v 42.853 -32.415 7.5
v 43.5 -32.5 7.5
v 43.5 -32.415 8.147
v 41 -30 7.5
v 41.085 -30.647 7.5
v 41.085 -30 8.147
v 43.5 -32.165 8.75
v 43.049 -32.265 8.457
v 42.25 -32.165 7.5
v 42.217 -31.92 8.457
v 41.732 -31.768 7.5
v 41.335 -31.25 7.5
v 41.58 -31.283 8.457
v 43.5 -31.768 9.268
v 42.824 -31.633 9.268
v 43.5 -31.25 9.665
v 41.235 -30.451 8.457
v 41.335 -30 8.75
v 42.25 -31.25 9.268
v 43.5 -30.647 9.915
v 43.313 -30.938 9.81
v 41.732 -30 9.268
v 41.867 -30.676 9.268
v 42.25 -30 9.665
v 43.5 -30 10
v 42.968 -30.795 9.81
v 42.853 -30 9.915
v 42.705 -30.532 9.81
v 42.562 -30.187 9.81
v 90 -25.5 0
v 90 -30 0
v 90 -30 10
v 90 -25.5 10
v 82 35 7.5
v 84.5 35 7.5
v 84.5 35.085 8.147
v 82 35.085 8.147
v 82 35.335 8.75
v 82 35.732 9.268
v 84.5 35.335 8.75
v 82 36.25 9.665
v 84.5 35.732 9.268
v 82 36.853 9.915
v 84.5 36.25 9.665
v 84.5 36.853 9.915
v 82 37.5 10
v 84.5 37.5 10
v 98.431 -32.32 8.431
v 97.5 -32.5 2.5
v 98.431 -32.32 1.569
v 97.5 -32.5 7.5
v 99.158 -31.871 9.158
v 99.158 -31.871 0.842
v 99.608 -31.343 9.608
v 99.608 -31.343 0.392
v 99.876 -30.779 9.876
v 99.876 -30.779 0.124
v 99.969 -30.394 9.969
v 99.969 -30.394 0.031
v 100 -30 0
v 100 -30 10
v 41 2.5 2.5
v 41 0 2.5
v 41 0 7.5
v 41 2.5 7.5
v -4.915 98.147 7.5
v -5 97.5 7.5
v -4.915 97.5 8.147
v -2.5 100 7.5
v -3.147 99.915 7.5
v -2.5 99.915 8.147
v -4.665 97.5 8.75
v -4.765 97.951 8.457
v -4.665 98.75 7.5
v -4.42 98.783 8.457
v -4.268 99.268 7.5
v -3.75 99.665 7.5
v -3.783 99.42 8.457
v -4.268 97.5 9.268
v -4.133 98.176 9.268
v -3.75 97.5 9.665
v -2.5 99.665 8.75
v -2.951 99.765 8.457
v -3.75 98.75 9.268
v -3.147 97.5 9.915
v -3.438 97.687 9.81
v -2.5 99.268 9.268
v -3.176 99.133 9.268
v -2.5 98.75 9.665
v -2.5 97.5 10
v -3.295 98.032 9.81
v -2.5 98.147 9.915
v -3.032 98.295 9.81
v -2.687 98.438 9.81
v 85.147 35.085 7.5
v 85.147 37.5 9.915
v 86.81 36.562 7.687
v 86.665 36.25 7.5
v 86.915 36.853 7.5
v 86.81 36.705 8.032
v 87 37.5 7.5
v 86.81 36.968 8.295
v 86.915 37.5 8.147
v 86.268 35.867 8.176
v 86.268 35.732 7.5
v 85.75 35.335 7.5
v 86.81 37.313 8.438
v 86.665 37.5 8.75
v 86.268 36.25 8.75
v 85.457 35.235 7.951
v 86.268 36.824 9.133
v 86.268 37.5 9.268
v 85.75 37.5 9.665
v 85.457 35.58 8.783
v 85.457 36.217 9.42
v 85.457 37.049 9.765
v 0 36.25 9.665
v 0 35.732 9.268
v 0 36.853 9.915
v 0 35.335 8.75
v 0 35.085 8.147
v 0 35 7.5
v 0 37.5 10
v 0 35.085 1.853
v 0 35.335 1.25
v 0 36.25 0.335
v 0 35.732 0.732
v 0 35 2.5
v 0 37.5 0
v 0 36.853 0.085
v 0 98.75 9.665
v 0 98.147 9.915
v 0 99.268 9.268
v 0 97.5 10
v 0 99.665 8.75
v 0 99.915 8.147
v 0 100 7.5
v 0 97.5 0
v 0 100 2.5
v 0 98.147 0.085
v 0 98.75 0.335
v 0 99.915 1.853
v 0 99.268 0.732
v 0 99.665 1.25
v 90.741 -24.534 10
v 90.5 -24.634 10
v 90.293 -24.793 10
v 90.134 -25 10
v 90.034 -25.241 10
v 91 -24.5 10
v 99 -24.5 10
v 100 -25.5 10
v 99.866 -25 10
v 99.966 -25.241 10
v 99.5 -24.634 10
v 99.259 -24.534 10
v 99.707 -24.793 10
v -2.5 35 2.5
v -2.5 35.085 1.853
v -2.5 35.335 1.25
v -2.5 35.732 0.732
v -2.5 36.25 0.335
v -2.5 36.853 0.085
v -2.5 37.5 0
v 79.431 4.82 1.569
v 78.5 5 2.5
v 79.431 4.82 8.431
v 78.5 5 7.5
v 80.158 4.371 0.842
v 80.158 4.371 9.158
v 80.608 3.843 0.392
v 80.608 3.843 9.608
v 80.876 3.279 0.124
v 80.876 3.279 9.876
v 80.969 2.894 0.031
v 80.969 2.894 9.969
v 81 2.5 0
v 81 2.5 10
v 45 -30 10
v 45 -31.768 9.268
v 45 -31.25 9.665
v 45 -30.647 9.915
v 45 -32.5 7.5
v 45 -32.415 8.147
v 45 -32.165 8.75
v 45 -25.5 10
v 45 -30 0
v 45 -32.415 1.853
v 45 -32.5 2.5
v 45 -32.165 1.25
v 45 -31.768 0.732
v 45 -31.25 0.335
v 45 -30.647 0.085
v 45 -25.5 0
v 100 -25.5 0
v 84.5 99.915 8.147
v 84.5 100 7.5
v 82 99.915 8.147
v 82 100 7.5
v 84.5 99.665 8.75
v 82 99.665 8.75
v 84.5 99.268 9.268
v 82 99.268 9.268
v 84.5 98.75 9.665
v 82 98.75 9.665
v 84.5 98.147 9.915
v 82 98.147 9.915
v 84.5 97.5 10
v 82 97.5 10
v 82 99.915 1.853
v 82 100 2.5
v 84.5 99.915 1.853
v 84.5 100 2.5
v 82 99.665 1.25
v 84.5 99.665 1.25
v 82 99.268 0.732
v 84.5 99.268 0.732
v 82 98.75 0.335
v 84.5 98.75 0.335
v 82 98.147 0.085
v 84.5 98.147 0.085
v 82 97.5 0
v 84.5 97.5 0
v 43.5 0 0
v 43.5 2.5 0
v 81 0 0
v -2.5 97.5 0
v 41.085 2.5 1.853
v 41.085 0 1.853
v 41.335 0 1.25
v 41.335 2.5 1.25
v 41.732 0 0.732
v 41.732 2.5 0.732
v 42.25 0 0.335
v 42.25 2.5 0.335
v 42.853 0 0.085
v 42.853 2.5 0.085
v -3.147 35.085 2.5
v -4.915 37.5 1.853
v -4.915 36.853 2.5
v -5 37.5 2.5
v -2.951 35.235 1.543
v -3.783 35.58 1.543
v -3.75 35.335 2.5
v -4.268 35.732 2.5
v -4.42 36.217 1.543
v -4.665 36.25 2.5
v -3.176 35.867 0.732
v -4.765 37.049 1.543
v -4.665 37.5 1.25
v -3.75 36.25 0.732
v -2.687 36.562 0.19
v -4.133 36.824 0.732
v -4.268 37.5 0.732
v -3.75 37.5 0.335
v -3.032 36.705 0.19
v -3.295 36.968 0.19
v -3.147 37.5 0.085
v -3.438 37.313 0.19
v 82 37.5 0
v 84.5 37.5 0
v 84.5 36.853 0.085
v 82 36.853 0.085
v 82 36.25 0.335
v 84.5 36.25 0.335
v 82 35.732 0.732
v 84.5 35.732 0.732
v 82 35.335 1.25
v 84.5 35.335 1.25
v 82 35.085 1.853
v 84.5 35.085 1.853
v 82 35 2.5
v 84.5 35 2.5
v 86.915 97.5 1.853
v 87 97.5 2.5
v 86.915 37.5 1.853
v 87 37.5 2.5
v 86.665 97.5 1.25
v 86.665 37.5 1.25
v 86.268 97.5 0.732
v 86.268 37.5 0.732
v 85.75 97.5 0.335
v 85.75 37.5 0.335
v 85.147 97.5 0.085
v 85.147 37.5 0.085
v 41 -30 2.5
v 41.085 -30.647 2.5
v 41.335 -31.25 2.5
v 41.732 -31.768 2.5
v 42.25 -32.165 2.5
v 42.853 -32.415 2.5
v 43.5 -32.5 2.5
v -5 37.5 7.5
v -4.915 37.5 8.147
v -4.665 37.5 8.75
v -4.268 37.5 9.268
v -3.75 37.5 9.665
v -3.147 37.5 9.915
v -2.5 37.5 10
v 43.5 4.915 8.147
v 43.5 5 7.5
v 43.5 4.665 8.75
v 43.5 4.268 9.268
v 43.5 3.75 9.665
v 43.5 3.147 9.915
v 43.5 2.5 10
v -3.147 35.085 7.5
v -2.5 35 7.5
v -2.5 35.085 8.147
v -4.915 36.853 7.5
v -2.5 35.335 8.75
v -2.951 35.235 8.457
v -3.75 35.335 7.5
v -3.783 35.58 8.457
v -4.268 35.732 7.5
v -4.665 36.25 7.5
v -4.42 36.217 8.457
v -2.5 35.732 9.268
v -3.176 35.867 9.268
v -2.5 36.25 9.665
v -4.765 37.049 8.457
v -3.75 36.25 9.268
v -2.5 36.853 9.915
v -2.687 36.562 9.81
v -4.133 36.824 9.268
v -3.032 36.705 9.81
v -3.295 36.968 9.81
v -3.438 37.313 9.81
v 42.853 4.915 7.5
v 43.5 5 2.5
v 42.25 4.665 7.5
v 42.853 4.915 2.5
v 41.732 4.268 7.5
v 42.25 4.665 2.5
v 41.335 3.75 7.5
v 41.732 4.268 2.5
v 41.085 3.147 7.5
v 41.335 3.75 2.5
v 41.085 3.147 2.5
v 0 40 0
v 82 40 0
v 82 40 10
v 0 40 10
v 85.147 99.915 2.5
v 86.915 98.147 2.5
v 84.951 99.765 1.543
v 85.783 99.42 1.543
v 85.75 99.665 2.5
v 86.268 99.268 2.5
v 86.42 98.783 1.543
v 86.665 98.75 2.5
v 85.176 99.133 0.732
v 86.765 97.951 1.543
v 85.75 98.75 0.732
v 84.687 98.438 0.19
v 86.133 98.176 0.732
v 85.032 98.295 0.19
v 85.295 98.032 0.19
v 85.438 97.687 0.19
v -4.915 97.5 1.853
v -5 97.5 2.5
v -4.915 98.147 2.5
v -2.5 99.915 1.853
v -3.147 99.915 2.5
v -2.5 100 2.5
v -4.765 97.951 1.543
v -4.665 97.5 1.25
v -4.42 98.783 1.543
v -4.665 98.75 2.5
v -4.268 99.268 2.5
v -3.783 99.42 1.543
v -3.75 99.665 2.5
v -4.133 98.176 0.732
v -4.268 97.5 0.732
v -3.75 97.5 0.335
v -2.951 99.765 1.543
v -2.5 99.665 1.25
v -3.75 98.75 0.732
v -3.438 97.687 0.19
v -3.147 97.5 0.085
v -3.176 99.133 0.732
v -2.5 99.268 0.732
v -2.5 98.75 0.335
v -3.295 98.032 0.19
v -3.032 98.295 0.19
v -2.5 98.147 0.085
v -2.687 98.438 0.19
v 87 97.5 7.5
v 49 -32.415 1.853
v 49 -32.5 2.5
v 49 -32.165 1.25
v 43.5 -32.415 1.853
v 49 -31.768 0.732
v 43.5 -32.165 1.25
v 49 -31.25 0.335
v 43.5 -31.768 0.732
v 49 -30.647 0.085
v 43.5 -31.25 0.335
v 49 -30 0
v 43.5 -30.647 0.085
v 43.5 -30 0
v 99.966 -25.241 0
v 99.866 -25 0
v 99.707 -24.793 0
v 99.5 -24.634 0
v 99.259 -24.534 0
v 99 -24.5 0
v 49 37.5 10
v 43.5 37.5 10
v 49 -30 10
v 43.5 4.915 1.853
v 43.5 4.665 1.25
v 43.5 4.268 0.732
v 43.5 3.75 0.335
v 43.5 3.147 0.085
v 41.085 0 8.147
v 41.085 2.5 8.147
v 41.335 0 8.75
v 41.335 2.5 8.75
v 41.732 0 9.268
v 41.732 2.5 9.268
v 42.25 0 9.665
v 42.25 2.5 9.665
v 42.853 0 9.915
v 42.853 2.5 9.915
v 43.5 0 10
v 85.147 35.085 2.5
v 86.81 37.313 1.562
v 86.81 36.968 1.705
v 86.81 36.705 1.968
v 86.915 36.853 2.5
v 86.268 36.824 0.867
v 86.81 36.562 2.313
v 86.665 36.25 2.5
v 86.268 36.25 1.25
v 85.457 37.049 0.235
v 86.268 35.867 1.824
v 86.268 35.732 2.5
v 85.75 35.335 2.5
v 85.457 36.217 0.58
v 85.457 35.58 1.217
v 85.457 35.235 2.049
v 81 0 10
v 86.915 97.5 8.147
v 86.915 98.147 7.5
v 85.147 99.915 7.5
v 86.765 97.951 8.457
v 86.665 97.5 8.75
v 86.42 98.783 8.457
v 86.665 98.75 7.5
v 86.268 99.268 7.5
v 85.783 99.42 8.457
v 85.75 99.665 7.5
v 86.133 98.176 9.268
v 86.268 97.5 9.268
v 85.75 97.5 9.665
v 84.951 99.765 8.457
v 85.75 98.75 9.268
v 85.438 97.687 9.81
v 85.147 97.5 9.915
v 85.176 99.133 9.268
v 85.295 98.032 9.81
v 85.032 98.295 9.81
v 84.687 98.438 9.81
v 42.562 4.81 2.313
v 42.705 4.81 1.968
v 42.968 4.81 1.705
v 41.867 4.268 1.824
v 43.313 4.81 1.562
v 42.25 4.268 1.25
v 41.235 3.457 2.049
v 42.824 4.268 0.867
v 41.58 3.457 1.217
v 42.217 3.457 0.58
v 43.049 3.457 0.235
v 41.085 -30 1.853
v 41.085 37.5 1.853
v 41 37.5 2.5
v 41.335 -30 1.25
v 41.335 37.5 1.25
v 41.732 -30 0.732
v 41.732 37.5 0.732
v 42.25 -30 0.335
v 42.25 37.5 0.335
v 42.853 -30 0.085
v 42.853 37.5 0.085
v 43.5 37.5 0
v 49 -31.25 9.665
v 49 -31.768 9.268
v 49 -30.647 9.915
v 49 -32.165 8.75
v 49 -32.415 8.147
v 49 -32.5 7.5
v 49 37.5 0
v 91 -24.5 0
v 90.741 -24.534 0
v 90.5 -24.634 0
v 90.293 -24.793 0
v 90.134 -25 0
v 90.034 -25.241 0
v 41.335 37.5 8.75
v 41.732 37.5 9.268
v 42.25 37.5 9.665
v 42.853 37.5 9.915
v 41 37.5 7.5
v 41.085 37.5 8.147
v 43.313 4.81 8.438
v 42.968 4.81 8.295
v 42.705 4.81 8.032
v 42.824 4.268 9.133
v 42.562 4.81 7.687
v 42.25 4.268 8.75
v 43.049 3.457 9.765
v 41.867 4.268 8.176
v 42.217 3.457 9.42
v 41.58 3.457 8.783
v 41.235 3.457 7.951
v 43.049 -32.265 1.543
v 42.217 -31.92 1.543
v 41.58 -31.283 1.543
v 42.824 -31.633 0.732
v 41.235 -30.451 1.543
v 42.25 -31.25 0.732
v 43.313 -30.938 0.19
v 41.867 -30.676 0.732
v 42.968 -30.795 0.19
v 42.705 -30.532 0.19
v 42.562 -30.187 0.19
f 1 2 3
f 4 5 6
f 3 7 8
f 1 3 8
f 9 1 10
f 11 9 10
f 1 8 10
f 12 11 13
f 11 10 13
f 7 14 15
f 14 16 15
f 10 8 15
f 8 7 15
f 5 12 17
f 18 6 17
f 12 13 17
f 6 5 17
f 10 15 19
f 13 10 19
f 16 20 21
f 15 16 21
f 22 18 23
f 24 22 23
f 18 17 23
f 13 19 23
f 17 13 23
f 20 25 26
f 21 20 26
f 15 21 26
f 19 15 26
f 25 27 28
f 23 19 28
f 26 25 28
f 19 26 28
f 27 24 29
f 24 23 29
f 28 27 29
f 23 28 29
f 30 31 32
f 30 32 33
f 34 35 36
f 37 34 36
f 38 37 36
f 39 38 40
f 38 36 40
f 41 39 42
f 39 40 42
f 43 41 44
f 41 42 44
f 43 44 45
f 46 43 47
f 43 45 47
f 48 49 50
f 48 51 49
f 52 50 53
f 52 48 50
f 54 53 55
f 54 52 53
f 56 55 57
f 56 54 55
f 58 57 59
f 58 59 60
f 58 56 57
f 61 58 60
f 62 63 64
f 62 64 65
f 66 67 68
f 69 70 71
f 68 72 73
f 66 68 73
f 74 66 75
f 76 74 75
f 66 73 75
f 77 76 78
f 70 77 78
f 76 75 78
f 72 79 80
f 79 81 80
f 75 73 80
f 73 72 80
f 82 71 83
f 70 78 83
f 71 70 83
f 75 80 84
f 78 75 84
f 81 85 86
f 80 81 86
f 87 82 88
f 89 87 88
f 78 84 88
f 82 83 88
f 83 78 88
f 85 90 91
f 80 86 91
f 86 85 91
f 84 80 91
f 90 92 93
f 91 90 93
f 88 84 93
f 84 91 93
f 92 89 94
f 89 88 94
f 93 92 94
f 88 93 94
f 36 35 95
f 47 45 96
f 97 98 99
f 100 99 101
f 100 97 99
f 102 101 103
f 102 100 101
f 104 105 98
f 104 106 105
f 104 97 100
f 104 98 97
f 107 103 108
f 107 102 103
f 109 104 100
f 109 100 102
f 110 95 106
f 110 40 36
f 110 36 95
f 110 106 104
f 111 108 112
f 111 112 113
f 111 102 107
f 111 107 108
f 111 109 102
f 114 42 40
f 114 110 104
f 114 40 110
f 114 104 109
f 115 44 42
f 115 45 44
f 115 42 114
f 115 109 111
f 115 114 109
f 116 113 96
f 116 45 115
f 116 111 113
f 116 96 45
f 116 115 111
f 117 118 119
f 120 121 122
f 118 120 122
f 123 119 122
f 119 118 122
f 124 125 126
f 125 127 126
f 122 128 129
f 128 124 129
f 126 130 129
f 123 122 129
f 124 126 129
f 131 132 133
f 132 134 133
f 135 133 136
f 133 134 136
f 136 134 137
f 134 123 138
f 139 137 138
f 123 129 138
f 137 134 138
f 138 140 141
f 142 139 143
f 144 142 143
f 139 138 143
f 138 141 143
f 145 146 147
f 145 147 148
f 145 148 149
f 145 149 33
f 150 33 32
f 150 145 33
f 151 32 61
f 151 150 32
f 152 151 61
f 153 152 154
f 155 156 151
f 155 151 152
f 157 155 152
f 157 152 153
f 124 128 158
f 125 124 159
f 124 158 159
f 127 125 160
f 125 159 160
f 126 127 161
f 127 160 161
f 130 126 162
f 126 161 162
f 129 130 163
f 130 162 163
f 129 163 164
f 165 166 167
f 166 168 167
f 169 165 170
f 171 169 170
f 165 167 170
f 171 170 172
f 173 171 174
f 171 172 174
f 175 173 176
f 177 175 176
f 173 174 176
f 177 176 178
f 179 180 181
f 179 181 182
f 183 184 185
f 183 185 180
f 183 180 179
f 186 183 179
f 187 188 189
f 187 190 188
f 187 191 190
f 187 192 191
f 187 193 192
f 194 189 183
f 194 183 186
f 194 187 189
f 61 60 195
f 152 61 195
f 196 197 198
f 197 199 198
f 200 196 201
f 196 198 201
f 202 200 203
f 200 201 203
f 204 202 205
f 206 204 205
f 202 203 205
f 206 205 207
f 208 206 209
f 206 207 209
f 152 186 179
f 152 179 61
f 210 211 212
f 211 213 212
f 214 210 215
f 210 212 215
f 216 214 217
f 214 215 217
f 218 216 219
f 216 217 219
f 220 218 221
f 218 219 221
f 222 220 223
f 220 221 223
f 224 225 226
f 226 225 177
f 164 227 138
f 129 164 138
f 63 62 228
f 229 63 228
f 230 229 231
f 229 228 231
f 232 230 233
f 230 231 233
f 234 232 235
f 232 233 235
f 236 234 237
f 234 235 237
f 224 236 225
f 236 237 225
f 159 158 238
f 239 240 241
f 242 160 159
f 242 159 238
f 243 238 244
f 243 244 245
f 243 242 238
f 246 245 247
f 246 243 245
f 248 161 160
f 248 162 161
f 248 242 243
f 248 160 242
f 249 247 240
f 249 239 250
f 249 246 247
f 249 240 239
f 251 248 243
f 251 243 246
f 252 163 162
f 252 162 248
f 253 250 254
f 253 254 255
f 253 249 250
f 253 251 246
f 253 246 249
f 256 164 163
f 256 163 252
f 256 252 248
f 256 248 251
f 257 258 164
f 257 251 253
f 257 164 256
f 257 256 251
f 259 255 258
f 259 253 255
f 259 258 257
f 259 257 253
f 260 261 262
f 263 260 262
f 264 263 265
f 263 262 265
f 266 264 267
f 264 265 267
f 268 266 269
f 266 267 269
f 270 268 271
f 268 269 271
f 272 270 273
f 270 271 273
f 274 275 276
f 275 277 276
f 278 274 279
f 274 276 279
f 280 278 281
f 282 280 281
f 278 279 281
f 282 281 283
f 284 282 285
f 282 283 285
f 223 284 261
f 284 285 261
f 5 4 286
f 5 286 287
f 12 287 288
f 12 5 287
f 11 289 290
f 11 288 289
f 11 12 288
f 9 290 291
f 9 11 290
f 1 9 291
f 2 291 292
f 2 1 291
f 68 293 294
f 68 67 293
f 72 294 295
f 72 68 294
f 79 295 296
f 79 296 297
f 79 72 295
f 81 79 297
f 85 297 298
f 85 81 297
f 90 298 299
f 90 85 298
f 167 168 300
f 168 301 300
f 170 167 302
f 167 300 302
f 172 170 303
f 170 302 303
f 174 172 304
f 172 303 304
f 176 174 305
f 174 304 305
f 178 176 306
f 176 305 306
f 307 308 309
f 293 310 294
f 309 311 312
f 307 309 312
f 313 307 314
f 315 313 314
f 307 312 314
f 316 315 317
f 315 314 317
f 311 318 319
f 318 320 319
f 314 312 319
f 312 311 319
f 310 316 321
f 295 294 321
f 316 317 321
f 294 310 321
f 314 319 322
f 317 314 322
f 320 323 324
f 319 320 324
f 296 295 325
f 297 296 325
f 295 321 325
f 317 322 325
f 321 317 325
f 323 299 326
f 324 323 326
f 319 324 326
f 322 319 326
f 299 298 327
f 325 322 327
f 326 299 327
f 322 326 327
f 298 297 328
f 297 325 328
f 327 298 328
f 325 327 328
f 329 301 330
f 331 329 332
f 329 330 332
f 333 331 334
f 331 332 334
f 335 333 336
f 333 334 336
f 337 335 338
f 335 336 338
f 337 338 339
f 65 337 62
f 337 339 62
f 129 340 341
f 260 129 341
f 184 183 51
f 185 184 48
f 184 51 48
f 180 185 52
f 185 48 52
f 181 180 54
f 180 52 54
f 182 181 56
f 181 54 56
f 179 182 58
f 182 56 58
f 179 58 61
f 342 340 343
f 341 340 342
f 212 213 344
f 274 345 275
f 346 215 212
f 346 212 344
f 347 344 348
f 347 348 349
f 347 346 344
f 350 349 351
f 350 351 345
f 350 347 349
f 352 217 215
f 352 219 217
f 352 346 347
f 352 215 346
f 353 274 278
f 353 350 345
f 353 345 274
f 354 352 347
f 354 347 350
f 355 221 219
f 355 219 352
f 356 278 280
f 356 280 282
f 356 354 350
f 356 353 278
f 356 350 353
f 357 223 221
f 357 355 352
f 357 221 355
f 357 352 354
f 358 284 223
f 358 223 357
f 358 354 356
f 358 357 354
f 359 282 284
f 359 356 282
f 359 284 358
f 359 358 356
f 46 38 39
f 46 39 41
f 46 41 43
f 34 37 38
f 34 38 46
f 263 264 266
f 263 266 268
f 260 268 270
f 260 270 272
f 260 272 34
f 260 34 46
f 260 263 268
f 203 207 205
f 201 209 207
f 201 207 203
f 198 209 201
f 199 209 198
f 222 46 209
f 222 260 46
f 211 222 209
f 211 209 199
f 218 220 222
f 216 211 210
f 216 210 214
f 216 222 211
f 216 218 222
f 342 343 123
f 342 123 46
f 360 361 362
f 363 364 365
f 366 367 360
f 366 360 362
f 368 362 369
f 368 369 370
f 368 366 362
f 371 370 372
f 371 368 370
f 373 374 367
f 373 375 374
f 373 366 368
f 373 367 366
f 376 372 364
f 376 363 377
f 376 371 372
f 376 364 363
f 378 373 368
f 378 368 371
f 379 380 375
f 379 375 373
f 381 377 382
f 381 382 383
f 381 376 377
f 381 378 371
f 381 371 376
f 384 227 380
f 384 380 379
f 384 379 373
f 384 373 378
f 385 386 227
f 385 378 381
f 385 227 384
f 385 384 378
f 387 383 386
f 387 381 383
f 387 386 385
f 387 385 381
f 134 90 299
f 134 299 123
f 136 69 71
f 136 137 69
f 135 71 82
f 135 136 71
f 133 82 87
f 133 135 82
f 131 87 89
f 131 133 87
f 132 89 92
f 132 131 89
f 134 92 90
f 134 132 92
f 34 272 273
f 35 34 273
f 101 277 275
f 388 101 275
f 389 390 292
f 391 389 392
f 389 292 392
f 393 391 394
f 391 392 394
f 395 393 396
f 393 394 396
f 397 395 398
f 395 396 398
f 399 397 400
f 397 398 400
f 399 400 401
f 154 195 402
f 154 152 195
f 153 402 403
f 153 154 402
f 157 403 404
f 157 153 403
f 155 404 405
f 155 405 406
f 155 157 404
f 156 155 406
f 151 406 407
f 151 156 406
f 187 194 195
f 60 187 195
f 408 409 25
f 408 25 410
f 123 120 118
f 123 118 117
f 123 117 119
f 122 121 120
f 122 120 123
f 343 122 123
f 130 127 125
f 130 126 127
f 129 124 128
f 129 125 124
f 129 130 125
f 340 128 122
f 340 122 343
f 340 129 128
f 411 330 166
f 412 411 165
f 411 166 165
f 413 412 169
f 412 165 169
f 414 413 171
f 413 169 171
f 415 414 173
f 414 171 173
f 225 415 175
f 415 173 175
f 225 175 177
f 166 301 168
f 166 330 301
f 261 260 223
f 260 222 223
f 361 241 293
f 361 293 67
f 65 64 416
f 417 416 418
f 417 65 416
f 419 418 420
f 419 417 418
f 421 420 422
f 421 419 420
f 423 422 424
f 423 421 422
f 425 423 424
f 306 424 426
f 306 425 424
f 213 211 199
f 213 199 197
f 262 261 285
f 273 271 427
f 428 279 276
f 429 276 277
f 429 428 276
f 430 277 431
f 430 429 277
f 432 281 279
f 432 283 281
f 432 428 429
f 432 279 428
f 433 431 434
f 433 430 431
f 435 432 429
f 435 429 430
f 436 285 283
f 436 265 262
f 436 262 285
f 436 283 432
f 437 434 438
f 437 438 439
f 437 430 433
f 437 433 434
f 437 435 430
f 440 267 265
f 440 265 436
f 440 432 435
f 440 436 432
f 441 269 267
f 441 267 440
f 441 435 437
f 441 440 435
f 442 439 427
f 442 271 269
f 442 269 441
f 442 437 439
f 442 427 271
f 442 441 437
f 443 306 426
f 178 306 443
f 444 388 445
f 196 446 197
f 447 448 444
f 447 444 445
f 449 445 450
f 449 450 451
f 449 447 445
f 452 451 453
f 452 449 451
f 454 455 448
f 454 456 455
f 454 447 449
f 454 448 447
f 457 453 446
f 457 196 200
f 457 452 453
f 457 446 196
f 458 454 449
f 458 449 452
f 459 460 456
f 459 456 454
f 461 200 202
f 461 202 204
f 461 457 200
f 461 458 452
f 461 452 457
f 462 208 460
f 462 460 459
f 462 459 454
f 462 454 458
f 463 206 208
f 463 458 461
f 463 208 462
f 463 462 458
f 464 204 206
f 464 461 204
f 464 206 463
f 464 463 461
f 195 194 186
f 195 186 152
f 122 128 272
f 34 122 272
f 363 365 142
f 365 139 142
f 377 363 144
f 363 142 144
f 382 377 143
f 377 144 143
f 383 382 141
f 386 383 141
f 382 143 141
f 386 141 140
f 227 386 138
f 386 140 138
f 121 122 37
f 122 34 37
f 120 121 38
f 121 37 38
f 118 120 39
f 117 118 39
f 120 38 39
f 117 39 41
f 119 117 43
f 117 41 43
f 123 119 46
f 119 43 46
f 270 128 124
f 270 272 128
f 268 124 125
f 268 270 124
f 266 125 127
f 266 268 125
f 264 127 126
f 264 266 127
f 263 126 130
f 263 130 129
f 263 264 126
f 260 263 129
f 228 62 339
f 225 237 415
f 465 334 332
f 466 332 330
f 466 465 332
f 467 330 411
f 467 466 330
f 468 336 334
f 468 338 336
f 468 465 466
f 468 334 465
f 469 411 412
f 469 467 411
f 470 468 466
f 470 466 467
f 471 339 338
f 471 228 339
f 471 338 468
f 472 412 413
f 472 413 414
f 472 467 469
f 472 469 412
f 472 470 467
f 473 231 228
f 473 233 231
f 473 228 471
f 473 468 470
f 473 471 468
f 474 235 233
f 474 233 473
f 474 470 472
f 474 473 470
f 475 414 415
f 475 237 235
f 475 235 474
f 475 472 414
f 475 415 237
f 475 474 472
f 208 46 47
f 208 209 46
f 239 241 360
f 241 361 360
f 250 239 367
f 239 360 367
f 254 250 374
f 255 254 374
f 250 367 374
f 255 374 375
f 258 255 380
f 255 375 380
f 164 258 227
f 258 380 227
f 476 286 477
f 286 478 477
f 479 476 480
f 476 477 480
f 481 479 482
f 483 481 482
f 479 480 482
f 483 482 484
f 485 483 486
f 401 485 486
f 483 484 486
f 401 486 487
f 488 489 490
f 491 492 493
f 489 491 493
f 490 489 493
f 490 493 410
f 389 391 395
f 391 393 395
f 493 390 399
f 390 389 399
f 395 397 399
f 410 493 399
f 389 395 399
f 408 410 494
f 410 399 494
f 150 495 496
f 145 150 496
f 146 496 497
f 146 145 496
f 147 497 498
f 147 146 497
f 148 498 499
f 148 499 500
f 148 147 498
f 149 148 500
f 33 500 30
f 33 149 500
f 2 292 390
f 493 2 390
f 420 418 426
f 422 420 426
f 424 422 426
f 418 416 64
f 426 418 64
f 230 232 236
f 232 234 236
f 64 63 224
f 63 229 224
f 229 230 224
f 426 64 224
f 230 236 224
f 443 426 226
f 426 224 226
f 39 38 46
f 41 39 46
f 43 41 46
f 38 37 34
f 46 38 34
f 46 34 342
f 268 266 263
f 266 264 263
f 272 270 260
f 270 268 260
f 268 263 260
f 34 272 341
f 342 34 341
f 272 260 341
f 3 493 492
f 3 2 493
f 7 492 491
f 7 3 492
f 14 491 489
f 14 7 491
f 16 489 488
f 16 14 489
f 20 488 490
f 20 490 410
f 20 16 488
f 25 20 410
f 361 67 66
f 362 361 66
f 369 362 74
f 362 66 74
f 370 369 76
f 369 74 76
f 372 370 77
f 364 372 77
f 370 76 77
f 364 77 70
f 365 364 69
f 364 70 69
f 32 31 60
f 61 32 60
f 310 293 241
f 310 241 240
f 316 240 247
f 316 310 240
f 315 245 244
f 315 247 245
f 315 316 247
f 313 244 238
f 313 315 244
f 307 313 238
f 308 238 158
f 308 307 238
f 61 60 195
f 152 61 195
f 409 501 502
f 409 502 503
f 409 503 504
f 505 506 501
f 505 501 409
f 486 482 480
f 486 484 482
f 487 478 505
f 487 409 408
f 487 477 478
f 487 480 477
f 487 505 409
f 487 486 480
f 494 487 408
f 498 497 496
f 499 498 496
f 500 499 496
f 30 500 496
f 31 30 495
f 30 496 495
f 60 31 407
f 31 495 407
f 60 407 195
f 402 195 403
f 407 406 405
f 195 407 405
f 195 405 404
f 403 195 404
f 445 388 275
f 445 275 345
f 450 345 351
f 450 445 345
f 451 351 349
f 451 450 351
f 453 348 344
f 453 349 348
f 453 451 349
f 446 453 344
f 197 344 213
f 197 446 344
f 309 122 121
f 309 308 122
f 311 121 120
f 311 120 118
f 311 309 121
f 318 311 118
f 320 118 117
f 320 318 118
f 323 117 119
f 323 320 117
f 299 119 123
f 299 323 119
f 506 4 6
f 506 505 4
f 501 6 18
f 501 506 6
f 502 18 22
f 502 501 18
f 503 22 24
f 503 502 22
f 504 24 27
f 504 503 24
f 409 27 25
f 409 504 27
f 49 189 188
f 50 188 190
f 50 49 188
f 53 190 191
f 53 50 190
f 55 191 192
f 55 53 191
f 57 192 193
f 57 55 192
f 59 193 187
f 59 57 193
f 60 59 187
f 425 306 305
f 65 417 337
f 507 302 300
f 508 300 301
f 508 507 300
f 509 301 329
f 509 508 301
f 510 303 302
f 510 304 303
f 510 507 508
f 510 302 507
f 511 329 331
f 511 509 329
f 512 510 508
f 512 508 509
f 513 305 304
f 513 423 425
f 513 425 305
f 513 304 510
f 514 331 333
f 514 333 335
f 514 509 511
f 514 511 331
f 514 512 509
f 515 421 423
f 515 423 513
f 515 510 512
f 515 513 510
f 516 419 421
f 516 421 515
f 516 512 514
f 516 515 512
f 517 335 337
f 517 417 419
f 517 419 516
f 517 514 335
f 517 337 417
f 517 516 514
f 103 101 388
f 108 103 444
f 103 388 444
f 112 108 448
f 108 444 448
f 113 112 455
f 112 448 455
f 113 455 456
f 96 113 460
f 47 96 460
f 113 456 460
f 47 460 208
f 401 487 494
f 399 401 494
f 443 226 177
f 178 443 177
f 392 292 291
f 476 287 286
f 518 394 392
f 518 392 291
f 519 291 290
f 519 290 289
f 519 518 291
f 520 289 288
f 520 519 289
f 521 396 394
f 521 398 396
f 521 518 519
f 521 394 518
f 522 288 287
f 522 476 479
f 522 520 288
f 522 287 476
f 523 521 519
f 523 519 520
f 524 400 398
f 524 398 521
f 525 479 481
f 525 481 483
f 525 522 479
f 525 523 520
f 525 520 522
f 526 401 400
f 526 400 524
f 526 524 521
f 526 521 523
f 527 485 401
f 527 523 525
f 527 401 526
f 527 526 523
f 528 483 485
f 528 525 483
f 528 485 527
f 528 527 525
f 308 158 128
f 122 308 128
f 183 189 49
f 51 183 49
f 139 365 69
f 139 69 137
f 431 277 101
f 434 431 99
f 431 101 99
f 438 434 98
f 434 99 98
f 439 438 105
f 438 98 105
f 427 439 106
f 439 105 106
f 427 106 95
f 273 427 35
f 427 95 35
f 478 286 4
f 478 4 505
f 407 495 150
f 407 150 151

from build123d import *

# Parameters (mm, degrees)
BOX005_W     = 5
BOX005_H     = 65
BOX005_DEPTH = 10
FILLET_R     = 2.5
FILLET003_R  = 2.5
FILLET004_R  = 2.5
BOX_W        = 82
BOX_H        = 5
BOX_DEPTH    = 10
FILLET005_R  = 2.5
BOX006_W     = 5
BOX006_H     = 65
BOX006_DEPTH = 10
FILLET002_R  = 2.5
FILLET006_R  = 2.5
FILLET007_R  = 2.5
BOX001_W     = 8
BOX001_H     = 70
BOX001_DEPTH = 10
FILLET001_R  = 2.5
FILLET008_R  = 2.5
BOX002_W     = 40
BOX002_H     = 5
BOX002_DEPTH = 10
FILLET009_R  = 2.5
FILLET010_R  = 2.5
BOX003_W     = 55
BOX003_H     = 7
BOX003_DEPTH = 10
FILLET011_R  = 2.5
BOX004_W     = 10
BOX004_H     = 5.5
BOX004_DEPTH = 10
FILLET012_R  = 1
FILLET013_R  = 1


with BuildPart() as fillet004:
    # Box005 → Box005 (new body)
    with BuildSketch(Plane(origin=(-5, 35, 0), x_dir=(1, 0, 0), z_dir=(0, 0, 1))):
        with Locations((2.5, 32.5)):
            Rectangle(BOX005_W, BOX005_H)
    extrude(amount=BOX005_DEPTH)

    # Fillet
    fillet_edges = [fillet004.edges().sort_by_distance(p)[0] for p in [
        (-5, 35, 5),
    ]]
    fillet(fillet_edges, radius=FILLET_R)

    # Fillet003
    fillet003_edges = [fillet004.edges().sort_by_distance(p)[0] for p in [
        (-5, 100, 5),
    ]]
    fillet(fillet003_edges, radius=FILLET003_R)

    # Fillet004
    fillet004_edges = [fillet004.edges().sort_by_distance(p)[0] for p in [
        (-5, 67.5, 10),
        (-5, 67.5, 0),
    ]]
    fillet(fillet004_edges, radius=FILLET004_R)


with BuildPart() as fillet005:
    # Box → Box (new body)
    with BuildSketch(Plane(origin=(0, 35, 0), x_dir=(1, 0, 0), z_dir=(0, 0, 1))):
        with Locations((41, 2.5)):
            Rectangle(BOX_W, BOX_H)
    extrude(amount=BOX_DEPTH)

    # Fillet005
    fillet005_edges = [fillet005.edges().sort_by_distance(p)[0] for p in [
        (41, 35, 0),
        (41, 35, 10),
    ]]
    fillet(fillet005_edges, radius=FILLET005_R)


with BuildPart() as fillet007:
    # Box006 → Box006 (new body)
    with BuildSketch(Plane(origin=(82, 35, 0), x_dir=(1, 0, 0), z_dir=(0, 0, 1))):
        with Locations((2.5, 32.5)):
            Rectangle(BOX006_W, BOX006_H)
    extrude(amount=BOX006_DEPTH)

    # Fillet002
    fillet002_edges = [fillet007.edges().sort_by_distance(p)[0] for p in [
        (87, 100, 5),
    ]]
    fillet(fillet002_edges, radius=FILLET002_R)

    # Fillet006
    fillet006_edges = [fillet007.edges().sort_by_distance(p)[0] for p in [
        (84.5, 35, 10),
        (84.5, 35, 0),
    ]]
    fillet(fillet006_edges, radius=FILLET006_R)

    # Fillet007
    fillet007_edges = [fillet007.edges().sort_by_distance(p)[0] for p in [
        (87, 67.5, 10),
        (87, 67.5, 0),
    ]]
    fillet(fillet007_edges, radius=FILLET007_R)


with BuildPart() as fillet008:
    # Box001 → Box001 (new body)
    with BuildSketch(Plane(origin=(41, -32.5, 0), x_dir=(1, 0, 0), z_dir=(0, 0, 1))):
        with Locations((4, 35)):
            Rectangle(BOX001_W, BOX001_H)
    extrude(amount=BOX001_DEPTH)

    # Fillet001
    fillet001_edges = [fillet008.edges().sort_by_distance(p)[0] for p in [
        (41, -32.5, 5),
    ]]
    fillet(fillet001_edges, radius=FILLET001_R)

    # Fillet008
    fillet008_edges = [fillet008.edges().sort_by_distance(p)[0] for p in [
        (41, 3.75, 10),
        (41, 3.75, 0),
    ]]
    fillet(fillet008_edges, radius=FILLET008_R)


with BuildPart() as fillet010:
    # Box002 → Box002 (new body)
    with BuildSketch(Plane(origin=(41, 0, 0), x_dir=(1, 0, 0), z_dir=(0, 0, 1))):
        with Locations((20, 2.5)):
            Rectangle(BOX002_W, BOX002_H)
    extrude(amount=BOX002_DEPTH)

    # Fillet009
    fillet009_edges = [fillet010.edges().sort_by_distance(p)[0] for p in [
        (41, 2.5, 10),
        (41, 2.5, 0),
    ]]
    fillet(fillet009_edges, radius=FILLET009_R)

    # Fillet010
    fillet010_edges = [fillet010.edges().sort_by_distance(p)[0] for p in [
        (62.25, 5, 0),
        (62.25, 5, 10),
        (81, 5, 5),
    ]]
    fillet(fillet010_edges, radius=FILLET010_R)


with BuildPart() as fillet011:
    # Box003 → Box003 (new body)
    with BuildSketch(Plane(origin=(45, -32.5, 0), x_dir=(1, 0, 0), z_dir=(0, 0, 1))):
        with Locations((27.5, 3.5)):
            Rectangle(BOX003_W, BOX003_H)
    extrude(amount=BOX003_DEPTH)

    # Fillet011
    fillet011_edges = [fillet011.edges().sort_by_distance(p)[0] for p in [
        (100, -32.5, 5),
        (72.5, -32.5, 0),
        (72.5, -32.5, 10),
    ]]
    fillet(fillet011_edges, radius=FILLET011_R)


with BuildPart() as fillet013:
    # Box004 → Box004 (new body)
    with BuildSketch(Plane(origin=(90, -30, 0), x_dir=(1, 0, 0), z_dir=(0, 0, 1))):
        with Locations((5, 2.75)):
            Rectangle(BOX004_W, BOX004_H)
    extrude(amount=BOX004_DEPTH)

    # Fillet012
    fillet012_edges = [fillet013.edges().sort_by_distance(p)[0] for p in [
        (100, -24.5, 5),
    ]]
    fillet(fillet012_edges, radius=FILLET012_R)

    # Fillet013
    fillet013_edges = [fillet013.edges().sort_by_distance(p)[0] for p in [
        (90, -24.5, 5),
    ]]
    fillet(fillet013_edges, radius=FILLET013_R)


solid = Compound([fillet004.part, fillet005.part, fillet007.part, fillet008.part, fillet010.part, fillet011.part, fillet013.part])
